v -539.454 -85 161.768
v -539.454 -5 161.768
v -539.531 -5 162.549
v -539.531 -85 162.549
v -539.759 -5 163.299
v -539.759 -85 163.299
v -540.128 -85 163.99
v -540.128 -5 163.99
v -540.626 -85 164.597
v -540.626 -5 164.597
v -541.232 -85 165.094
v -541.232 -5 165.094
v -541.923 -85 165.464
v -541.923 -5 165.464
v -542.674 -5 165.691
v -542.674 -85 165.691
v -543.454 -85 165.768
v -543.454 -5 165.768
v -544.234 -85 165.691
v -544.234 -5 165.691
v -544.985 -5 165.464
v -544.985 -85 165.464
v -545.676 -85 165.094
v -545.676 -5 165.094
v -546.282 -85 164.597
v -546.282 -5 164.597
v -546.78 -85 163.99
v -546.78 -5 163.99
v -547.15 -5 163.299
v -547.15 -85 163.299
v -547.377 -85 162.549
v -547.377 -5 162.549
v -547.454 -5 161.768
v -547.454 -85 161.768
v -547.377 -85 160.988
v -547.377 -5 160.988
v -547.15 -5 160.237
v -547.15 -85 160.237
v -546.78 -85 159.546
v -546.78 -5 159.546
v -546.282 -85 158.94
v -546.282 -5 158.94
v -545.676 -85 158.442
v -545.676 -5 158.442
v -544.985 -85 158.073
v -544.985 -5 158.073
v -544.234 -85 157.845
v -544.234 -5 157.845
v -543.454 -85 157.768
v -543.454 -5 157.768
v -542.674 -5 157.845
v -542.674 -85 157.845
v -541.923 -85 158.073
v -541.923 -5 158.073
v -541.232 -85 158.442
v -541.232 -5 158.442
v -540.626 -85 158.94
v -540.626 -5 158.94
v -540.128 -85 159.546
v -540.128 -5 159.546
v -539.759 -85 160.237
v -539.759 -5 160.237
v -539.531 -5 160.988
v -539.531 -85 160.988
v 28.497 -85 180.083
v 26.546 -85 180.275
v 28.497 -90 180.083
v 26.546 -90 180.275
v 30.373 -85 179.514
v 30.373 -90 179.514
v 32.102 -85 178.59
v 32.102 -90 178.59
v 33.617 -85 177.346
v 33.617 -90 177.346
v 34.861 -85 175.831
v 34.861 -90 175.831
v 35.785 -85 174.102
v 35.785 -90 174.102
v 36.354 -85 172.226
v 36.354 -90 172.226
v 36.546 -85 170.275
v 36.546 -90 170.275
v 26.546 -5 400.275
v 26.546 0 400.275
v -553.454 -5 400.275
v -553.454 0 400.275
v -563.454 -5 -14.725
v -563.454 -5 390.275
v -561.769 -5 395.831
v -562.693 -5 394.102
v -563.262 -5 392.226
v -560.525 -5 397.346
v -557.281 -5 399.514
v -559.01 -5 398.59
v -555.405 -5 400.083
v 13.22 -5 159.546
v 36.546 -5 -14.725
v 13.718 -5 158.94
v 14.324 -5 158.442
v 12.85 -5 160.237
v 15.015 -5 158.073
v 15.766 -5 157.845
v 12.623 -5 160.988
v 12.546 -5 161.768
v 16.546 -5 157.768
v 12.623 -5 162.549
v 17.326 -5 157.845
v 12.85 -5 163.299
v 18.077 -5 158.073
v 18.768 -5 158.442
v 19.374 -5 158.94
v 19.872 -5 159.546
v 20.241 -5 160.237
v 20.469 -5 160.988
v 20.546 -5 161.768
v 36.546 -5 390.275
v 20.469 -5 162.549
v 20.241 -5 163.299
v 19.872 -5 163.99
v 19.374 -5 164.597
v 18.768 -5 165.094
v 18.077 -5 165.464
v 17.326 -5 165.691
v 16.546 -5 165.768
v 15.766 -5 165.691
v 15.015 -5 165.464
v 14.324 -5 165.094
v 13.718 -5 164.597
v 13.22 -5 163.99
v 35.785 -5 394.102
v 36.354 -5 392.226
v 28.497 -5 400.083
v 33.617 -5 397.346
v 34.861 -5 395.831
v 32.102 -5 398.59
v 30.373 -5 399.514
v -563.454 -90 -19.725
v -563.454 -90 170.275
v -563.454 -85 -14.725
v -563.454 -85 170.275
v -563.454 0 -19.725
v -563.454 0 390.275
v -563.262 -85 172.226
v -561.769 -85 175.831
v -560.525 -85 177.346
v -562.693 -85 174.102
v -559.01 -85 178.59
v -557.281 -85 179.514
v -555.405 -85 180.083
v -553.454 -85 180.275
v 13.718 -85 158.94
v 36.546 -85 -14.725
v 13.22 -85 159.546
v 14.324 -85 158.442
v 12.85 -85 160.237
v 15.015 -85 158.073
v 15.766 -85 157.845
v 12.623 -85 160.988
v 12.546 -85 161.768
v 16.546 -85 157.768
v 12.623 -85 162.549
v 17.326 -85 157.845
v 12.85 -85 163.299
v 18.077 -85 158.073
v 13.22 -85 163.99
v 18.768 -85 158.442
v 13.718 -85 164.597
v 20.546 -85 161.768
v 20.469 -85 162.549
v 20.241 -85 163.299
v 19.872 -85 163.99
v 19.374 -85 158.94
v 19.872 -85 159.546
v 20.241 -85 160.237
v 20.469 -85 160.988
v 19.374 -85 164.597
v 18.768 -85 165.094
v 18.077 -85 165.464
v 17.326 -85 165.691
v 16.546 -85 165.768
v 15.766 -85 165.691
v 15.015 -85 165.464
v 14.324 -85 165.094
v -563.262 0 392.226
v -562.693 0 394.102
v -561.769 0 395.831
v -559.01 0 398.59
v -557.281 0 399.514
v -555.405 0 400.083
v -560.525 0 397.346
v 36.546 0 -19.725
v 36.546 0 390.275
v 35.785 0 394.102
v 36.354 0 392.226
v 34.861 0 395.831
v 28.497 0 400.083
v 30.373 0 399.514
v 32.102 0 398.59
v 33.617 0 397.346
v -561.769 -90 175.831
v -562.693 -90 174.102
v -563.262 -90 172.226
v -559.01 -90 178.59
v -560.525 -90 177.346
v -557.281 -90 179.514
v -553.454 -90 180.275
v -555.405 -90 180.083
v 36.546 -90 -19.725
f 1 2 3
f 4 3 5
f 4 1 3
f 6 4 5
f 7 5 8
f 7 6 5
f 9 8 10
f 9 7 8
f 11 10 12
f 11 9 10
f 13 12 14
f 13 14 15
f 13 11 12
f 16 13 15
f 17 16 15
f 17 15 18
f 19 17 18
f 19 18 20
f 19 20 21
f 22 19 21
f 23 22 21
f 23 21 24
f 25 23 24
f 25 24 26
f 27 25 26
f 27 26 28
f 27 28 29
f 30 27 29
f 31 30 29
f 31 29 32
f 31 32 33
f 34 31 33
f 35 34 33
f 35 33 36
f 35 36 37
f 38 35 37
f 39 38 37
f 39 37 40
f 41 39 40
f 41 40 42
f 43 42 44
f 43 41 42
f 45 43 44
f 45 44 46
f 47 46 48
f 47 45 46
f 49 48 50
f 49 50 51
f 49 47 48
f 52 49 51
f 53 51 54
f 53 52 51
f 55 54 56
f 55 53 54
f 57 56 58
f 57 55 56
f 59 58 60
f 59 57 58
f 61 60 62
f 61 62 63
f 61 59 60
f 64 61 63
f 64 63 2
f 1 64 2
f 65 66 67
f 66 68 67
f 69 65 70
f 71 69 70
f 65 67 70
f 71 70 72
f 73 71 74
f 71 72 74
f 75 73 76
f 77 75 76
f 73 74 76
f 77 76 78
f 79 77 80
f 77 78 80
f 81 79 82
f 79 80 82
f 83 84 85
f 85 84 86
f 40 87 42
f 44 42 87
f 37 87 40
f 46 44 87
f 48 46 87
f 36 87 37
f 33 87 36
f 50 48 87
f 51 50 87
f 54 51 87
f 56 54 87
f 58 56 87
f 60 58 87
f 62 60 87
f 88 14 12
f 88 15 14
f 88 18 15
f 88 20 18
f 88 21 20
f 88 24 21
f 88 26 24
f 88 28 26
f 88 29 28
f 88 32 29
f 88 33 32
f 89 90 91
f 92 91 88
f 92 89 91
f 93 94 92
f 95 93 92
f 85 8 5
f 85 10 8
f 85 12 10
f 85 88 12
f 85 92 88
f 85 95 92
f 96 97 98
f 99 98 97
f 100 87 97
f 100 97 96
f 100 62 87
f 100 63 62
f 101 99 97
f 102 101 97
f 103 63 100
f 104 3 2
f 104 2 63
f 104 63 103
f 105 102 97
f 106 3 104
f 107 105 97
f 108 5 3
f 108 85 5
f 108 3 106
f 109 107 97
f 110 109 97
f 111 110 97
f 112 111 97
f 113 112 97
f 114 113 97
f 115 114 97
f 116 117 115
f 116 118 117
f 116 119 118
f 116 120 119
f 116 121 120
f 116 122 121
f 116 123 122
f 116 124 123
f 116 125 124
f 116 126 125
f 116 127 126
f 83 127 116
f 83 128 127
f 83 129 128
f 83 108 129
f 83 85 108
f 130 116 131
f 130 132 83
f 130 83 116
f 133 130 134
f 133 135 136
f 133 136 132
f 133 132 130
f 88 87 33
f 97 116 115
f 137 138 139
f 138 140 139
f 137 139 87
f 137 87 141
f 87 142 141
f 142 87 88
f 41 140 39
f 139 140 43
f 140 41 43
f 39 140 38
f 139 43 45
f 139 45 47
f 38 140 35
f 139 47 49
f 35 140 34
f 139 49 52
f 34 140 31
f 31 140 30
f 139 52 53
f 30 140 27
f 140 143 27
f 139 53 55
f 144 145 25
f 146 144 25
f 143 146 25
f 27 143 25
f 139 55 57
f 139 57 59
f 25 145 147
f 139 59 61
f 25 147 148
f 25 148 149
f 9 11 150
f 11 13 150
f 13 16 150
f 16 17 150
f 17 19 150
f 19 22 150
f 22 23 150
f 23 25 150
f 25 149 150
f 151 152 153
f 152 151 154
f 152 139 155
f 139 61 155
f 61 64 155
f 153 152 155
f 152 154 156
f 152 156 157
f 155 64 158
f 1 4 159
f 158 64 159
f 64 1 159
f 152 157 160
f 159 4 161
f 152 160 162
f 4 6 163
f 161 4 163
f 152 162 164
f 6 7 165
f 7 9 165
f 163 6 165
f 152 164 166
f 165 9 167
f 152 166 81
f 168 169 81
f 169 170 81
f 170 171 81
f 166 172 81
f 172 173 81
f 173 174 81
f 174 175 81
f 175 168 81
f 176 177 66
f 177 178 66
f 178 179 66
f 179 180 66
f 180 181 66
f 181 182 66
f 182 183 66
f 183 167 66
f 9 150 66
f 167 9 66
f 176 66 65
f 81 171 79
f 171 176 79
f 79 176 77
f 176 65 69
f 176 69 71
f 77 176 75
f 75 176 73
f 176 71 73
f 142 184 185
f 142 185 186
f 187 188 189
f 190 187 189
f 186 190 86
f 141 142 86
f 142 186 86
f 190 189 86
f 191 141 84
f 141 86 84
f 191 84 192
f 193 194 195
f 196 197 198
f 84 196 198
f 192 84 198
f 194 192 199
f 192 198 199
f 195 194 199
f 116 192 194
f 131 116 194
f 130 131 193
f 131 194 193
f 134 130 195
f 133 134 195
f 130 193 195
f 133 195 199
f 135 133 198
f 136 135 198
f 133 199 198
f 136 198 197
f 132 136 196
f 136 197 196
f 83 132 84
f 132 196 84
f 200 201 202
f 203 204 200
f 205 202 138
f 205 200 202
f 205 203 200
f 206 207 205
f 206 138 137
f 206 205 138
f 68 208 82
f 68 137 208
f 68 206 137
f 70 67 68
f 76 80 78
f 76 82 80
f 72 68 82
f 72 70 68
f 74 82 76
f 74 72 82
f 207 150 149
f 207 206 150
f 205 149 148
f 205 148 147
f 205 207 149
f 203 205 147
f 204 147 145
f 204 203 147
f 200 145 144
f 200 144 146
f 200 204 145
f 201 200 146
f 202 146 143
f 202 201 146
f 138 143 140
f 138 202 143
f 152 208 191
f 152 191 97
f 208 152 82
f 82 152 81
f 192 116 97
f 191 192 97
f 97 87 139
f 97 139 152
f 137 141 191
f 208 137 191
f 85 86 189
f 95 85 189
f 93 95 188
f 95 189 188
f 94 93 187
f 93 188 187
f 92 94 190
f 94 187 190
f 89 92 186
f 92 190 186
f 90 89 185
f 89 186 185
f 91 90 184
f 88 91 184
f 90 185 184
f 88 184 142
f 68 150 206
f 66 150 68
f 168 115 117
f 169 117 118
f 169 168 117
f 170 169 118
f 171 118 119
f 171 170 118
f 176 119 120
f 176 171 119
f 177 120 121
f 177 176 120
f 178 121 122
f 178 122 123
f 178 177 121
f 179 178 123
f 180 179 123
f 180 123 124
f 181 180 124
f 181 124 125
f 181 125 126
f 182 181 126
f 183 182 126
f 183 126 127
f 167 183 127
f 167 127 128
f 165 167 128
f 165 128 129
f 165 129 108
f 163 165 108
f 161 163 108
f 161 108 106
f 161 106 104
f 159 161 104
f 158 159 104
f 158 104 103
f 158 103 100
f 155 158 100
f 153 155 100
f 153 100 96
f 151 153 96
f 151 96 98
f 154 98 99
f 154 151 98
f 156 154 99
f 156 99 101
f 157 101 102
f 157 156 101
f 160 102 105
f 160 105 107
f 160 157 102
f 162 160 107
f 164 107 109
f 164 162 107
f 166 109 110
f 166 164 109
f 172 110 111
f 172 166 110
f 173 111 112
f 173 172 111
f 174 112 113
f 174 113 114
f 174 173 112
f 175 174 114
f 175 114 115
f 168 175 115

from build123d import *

# Parameters (mm, degrees)
F1_DEPTH = 5
F2_W     = 600
F2_H     = 5
F3_DEPTH = 80
F4_W     = 600
F4_H     = 5
F4_H_2   = 195
F5_DEPTH = 5
F6_R     = 10
F7_R     = 4
F8_DEPTH = 85


# Not quite as in the source:
# - a feature names something its author has since deleted; it is built from what else it names


with BuildPart() as f1:
    # F0 (on Front) → F1 (new body)
    with BuildSketch(Plane.XZ):
        with BuildLine():
            Line((26.5459360182, 400.2749490738), (-553.4540639818, 400.2749490738))
            ThreePointArc((-553.4540639818, 400.2749490738), (-560.5251317936, 397.3460168857), (-563.4540639818, 390.2749490738))
            Line((-563.4540639818, 390.2749490738), (-563.4540639818, -19.7250509262))
            Line((-563.4540639818, -19.7250509262), (36.5459360182, -19.7250509262))
            Line((36.5459360182, -19.7250509262), (36.5459360182, 390.2749490738))
            ThreePointArc((36.5459360182, 390.2749490738), (33.6170038301, 397.3460168857), (26.5459360182, 400.2749490738))
        make_face()
    extrude(amount=F1_DEPTH)

    # F2 (on face) → F3 (join)
    with BuildSketch(Plane.XZ.offset(5)):
        with Locations((-263.4540639818, -17.2250509262)):
            Rectangle(F2_W, F2_H)
    extrude(amount=F3_DEPTH)

    # F4 (on face) → F5 (join)
    with BuildSketch(Plane.XZ.offset(85)):
        with Locations((-263.4540639818, -17.2250509262)):
            Rectangle(F4_W, F4_H)
        with Locations((-263.4540639818, 82.7749490738)):
            Rectangle(F4_W, F4_H_2)
    extrude(amount=F5_DEPTH)

    # F6
    f6_edges = [f1.edges().sort_by_distance(p)[0] for p in [
        (-563.454064, -87.5, 180.274949),
        (36.545936, -87.5, 180.274949),
    ]]
    fillet(f6_edges, radius=F6_R)

    # F7 (on face) → F8 (join)
    with BuildSketch(Plane.XZ.offset(90)):
        with Locations((-543.4540639818, 161.7681980133)):
            Circle(F7_R)
        with Locations((16.5459360182, 161.7681980133)):
            Circle(F7_R)
    extrude(amount=-F8_DEPTH)


solid = f1.part
